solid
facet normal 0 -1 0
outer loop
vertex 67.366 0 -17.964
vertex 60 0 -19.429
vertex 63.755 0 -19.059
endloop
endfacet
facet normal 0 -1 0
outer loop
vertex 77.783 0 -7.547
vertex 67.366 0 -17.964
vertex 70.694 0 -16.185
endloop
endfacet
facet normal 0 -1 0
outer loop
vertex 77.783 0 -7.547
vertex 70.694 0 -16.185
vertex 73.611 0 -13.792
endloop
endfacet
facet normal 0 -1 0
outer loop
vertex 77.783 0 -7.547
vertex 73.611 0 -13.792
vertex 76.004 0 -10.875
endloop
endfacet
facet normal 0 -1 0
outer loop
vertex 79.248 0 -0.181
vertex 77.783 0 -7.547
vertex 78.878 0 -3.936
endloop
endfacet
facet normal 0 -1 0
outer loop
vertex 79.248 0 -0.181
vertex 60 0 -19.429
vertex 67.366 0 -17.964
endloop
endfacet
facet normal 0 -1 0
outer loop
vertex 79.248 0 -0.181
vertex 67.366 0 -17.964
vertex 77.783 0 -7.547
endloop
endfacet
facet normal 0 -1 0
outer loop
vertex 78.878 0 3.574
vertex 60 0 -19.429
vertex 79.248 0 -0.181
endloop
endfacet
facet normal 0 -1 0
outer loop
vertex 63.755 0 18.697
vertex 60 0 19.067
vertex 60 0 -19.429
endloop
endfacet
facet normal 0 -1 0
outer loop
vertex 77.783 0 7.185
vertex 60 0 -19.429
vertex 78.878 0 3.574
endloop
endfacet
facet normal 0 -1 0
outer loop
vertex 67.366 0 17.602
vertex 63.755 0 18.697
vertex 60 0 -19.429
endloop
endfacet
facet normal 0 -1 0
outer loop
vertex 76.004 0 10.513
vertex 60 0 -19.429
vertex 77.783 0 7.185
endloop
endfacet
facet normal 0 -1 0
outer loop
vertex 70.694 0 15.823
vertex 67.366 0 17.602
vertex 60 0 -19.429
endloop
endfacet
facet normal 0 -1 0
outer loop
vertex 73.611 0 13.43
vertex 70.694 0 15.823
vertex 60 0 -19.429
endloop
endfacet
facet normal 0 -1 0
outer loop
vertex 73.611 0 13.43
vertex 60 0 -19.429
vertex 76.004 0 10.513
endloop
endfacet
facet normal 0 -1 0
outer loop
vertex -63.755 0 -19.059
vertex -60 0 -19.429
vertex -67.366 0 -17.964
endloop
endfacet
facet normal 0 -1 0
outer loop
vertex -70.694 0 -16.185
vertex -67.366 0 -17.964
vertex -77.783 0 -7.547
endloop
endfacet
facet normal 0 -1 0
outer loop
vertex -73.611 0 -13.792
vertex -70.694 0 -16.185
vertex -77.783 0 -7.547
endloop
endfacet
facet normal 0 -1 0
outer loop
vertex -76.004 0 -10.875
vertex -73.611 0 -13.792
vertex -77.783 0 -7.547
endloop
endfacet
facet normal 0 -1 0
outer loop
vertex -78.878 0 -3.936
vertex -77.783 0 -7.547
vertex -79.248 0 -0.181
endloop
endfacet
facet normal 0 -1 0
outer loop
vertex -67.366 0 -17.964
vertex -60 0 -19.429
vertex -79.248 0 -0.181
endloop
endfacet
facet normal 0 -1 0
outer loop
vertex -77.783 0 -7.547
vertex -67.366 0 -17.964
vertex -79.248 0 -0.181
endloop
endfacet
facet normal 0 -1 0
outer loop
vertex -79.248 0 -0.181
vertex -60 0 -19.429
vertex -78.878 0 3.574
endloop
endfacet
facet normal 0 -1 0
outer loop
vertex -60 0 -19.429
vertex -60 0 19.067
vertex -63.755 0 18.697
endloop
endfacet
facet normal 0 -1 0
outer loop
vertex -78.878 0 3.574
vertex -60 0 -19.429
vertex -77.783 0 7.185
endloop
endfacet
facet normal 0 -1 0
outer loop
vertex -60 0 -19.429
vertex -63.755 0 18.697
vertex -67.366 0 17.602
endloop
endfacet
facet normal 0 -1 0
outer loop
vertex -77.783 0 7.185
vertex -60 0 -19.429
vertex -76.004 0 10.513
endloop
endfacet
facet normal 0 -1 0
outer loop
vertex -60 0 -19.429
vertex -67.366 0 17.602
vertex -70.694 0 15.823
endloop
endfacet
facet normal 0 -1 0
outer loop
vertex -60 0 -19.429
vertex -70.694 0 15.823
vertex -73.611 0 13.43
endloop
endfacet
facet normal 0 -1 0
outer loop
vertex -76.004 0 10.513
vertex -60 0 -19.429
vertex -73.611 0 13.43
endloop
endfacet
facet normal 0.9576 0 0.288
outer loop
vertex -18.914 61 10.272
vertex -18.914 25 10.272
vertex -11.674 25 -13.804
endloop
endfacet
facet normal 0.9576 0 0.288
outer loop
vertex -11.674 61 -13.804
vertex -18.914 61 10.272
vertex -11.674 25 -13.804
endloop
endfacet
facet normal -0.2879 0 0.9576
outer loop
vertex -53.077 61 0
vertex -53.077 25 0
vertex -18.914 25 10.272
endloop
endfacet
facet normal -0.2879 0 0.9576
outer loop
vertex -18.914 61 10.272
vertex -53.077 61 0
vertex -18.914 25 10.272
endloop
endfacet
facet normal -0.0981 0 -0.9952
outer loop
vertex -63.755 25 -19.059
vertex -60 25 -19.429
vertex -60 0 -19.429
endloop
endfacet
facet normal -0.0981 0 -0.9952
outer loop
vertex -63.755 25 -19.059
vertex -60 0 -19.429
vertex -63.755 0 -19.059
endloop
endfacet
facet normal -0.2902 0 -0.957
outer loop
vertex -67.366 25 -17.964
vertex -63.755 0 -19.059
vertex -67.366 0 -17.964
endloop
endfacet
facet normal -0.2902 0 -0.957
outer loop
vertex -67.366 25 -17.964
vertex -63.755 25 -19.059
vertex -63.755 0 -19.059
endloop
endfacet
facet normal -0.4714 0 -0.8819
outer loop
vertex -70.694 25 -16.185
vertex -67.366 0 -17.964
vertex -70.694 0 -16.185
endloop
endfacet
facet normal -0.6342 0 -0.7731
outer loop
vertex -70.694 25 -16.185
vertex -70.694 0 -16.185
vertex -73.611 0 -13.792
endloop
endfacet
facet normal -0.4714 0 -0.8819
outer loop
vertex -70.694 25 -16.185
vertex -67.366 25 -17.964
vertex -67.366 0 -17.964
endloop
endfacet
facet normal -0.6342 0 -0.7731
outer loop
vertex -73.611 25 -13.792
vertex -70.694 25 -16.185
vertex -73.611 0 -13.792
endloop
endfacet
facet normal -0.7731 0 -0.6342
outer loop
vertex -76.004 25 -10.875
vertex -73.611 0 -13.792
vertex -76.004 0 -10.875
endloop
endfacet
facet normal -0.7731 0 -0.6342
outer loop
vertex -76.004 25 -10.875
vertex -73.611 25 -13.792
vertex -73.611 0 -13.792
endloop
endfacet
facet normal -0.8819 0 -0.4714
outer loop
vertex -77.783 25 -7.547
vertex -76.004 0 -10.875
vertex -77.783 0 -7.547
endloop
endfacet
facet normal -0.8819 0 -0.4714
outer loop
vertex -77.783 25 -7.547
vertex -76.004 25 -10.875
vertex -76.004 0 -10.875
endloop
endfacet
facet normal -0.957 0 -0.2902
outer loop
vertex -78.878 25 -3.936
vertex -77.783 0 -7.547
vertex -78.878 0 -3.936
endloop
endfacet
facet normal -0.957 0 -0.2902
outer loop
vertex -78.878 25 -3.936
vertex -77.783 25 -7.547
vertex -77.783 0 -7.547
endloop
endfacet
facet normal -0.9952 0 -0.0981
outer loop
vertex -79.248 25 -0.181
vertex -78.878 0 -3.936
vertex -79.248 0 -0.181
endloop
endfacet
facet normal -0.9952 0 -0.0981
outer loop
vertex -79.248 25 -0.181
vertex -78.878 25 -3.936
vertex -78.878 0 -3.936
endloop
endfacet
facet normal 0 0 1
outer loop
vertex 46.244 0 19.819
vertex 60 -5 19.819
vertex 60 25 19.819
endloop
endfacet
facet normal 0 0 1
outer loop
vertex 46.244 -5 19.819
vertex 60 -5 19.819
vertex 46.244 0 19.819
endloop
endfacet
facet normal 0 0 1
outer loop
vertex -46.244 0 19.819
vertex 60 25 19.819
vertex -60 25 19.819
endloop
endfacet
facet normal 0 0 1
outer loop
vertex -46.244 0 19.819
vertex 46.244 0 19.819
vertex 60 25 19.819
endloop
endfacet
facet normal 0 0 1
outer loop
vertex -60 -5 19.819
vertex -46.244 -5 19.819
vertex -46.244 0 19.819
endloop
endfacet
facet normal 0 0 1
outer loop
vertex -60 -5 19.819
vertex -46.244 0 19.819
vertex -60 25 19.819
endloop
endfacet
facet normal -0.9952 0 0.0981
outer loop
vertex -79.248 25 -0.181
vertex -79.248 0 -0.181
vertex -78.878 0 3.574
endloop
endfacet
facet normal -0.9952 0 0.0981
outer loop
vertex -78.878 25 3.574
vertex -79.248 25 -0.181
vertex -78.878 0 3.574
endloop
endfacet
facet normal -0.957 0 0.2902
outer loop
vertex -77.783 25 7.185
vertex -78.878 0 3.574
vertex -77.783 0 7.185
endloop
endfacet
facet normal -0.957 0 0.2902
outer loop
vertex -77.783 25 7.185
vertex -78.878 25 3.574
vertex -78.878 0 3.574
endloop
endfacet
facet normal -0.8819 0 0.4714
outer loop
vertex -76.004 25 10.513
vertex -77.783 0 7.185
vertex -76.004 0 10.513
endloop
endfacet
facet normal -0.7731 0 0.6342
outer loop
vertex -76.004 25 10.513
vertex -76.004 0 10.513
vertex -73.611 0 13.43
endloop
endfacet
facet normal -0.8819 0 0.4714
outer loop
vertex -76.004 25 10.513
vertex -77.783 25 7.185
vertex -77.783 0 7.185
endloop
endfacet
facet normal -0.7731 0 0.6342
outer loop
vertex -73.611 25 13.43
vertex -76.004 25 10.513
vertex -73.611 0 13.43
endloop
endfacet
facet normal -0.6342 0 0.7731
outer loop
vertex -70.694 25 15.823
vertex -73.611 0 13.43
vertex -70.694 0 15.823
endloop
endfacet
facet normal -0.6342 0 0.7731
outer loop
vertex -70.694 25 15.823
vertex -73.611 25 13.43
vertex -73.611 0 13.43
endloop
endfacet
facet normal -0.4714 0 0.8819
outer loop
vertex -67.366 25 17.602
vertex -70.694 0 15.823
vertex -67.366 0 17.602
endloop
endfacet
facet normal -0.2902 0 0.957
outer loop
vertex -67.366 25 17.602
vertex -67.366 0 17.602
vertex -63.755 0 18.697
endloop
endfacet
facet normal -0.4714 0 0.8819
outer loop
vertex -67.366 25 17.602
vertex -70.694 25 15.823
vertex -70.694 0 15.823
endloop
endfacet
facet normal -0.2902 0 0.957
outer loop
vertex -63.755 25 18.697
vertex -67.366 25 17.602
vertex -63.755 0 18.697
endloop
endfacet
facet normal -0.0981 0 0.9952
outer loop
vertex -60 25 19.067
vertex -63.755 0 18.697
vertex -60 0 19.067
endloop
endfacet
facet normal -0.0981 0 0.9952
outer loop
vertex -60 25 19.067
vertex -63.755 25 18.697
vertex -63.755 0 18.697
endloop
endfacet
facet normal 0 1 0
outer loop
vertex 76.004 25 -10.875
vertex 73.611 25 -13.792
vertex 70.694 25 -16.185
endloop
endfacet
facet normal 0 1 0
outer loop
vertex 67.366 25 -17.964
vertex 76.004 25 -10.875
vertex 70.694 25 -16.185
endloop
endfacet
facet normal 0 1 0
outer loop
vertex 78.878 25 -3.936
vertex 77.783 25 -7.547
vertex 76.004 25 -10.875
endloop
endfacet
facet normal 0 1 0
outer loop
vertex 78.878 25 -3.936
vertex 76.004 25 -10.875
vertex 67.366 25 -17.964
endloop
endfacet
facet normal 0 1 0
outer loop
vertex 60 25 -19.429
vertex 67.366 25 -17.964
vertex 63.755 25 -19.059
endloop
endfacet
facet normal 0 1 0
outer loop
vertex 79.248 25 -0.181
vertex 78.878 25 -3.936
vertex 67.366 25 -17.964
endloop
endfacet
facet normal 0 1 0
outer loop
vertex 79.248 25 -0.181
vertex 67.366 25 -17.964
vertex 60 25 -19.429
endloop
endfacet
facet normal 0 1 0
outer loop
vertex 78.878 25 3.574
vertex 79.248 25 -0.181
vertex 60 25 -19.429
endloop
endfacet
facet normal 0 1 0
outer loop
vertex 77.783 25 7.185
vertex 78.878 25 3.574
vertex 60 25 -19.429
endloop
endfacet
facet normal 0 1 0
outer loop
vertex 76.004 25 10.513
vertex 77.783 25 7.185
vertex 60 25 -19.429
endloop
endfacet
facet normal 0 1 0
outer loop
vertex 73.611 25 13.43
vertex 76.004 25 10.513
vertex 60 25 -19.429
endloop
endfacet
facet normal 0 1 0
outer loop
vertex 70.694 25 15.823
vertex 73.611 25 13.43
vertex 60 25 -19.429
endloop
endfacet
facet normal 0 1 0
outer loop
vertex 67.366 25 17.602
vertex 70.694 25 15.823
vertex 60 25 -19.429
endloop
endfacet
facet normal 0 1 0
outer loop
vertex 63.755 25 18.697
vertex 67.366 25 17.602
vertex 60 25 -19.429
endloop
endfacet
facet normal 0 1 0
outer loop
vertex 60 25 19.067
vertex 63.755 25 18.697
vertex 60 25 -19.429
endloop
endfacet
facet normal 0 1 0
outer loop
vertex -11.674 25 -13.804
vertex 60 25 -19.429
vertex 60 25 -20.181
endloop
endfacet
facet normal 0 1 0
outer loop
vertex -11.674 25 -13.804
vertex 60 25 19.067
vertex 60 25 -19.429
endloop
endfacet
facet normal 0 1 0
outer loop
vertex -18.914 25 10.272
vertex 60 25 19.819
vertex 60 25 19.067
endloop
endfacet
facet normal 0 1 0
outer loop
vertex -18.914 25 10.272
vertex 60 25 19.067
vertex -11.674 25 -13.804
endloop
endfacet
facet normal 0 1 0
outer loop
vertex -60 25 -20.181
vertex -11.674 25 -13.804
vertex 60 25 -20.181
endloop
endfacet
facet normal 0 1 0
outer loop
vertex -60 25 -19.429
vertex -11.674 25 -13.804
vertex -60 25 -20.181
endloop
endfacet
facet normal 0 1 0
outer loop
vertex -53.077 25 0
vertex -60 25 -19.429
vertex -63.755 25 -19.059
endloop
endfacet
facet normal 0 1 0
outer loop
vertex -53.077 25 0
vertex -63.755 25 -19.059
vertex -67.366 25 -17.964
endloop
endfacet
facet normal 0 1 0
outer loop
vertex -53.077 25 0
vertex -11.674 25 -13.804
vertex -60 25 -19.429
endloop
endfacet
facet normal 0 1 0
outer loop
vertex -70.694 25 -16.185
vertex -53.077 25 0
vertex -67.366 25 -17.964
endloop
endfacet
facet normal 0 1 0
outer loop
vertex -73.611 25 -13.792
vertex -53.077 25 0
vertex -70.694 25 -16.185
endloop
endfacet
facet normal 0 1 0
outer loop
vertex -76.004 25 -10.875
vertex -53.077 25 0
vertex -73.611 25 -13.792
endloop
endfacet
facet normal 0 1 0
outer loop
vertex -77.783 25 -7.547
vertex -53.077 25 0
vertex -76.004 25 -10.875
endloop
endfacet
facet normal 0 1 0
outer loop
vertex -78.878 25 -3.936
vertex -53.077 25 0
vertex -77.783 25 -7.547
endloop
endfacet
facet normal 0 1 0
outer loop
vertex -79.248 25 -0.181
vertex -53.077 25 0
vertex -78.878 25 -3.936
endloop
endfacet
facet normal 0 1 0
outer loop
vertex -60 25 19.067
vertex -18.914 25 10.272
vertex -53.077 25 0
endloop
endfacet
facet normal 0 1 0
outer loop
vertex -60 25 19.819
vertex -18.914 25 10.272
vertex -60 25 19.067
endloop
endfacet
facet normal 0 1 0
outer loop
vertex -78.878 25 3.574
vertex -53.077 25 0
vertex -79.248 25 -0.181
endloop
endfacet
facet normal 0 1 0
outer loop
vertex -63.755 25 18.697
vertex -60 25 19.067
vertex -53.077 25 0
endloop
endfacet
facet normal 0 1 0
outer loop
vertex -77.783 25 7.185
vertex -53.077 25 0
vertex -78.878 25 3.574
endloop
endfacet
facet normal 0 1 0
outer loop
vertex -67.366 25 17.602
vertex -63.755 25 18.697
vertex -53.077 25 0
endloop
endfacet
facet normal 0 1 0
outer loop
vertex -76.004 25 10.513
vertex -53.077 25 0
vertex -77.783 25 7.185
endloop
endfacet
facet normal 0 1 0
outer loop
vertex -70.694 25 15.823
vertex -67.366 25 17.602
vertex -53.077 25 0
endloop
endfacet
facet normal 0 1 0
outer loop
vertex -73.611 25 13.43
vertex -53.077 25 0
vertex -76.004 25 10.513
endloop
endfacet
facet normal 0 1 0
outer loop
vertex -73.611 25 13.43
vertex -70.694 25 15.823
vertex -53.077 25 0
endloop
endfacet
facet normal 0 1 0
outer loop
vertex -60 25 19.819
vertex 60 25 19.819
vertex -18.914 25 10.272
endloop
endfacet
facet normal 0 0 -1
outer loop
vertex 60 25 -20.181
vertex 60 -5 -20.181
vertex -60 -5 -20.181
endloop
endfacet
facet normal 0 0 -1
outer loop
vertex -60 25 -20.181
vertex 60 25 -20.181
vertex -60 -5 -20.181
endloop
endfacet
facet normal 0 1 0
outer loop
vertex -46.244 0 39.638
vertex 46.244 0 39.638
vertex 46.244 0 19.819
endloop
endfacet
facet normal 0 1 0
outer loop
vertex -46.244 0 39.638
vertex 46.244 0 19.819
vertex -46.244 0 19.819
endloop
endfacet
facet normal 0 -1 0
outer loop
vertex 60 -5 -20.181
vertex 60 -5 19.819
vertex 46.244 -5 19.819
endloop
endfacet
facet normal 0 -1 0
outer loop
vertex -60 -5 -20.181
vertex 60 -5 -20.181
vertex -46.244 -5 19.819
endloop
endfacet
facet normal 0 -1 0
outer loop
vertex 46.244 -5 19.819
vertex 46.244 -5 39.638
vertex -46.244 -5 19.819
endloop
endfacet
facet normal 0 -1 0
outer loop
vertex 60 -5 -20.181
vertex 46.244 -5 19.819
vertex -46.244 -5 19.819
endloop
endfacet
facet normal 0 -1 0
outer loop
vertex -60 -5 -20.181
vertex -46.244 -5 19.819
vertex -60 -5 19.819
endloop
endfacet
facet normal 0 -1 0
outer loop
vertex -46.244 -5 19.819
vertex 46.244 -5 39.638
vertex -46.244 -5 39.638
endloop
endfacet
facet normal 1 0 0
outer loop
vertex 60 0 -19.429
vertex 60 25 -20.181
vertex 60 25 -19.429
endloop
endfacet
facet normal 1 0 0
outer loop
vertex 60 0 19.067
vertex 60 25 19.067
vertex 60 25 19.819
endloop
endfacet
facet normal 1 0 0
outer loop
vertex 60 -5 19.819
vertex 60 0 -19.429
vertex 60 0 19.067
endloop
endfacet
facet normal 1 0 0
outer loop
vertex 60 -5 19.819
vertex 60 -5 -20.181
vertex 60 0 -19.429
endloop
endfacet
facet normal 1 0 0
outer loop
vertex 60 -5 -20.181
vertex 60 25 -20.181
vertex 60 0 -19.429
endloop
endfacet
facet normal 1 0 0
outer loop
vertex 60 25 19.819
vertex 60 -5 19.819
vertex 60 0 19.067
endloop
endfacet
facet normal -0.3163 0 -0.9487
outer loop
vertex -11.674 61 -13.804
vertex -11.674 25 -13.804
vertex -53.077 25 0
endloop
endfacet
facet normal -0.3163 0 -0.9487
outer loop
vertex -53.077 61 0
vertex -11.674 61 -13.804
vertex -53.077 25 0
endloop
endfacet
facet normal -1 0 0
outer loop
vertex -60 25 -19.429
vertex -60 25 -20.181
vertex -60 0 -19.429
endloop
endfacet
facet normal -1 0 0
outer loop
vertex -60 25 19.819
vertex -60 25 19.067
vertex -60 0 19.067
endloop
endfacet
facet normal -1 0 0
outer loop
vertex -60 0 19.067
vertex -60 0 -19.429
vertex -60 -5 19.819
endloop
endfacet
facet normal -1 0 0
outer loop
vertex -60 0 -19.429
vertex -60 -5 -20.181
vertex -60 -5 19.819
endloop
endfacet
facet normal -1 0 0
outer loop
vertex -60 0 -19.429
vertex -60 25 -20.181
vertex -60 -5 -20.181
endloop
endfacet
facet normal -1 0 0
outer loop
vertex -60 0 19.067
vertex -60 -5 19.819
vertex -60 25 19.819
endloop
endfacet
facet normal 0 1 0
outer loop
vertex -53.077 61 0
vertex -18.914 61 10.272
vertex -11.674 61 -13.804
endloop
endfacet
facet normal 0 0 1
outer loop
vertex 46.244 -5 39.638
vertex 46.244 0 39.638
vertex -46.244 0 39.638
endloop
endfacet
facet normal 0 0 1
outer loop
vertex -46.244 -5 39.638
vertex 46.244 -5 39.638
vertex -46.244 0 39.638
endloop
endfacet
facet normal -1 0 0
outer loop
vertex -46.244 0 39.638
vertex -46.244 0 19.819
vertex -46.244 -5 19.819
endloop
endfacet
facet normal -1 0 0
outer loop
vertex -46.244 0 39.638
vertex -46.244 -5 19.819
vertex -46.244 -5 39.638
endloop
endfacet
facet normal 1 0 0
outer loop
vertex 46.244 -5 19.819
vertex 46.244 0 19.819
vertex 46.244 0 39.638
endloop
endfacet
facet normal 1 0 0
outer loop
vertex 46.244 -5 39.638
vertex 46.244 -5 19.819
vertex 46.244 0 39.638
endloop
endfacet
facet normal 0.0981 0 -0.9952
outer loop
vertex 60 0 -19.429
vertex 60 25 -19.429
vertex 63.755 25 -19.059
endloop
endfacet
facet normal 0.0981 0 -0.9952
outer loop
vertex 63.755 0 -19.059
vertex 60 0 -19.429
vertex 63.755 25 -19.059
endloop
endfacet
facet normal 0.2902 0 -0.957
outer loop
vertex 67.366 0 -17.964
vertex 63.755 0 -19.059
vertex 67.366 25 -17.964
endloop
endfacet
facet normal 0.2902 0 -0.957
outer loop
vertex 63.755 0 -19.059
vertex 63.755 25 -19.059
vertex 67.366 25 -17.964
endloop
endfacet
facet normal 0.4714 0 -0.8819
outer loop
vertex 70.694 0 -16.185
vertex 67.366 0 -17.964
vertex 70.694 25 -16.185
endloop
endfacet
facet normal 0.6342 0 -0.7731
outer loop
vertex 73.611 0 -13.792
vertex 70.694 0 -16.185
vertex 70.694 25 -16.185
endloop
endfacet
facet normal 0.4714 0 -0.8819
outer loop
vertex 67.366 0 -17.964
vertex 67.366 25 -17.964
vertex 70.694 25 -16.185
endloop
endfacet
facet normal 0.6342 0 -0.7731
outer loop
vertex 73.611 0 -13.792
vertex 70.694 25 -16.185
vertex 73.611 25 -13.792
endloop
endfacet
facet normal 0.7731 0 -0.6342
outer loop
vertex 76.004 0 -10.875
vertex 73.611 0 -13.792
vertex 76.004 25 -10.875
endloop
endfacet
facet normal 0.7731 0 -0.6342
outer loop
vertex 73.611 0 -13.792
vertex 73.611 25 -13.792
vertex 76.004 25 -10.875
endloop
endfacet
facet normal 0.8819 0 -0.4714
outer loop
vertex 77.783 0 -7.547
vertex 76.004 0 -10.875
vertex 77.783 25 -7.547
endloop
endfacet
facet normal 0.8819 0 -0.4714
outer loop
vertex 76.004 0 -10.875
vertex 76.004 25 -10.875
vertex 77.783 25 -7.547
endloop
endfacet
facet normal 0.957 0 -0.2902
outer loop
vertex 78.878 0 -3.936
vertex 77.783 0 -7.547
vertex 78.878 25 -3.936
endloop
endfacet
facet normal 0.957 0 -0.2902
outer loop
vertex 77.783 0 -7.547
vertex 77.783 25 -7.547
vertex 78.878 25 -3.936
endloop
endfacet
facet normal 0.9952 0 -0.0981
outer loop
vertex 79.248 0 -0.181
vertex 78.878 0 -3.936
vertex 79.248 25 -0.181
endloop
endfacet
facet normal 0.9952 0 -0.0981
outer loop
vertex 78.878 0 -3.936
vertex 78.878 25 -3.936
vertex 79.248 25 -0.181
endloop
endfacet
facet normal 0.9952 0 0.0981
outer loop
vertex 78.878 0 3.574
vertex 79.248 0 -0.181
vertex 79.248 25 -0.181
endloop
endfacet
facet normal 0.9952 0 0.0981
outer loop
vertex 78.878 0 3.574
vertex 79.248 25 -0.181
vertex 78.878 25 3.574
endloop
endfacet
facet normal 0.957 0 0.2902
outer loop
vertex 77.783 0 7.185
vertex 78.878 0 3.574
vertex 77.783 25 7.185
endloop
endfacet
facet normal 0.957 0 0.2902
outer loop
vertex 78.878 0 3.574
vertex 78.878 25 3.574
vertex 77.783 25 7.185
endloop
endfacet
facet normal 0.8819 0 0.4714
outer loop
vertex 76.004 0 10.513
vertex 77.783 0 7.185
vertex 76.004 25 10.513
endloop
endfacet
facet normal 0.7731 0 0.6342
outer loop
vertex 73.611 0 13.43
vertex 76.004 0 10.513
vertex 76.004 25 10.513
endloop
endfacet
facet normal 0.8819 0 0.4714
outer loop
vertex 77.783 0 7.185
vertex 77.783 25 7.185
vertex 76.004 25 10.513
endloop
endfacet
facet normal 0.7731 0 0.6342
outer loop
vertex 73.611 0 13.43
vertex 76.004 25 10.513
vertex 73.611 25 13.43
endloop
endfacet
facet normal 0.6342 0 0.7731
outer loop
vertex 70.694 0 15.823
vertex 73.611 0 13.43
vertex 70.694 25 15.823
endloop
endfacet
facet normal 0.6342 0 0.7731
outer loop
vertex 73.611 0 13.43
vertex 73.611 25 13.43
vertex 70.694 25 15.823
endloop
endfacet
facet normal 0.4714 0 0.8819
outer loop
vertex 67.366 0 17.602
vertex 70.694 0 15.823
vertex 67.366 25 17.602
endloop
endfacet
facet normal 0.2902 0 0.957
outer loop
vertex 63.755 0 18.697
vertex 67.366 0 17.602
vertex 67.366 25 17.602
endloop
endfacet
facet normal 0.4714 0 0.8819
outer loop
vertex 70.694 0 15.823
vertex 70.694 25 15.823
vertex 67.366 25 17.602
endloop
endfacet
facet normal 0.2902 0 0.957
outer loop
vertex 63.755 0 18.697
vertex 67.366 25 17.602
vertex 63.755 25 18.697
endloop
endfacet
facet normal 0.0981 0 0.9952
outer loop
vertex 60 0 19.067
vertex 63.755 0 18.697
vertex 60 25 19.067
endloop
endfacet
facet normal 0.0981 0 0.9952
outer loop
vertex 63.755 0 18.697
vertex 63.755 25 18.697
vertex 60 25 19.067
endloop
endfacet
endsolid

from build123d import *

# Parameters (mm, degrees)
F0_W     = 46.244312
F0_H     = 39.637983
F1_DEPTH = 5
F2_W     = 60
F2_H     = 40
F3_DEPTH = 30
F5_DEPTH = 25
F8_DEPTH = 36


with BuildPart() as f1:
    # F0 (on Front) → F1 (new body)
    with BuildSketch(Plane.XZ):
        with Locations((-23.122156, 19.818991)):
            Rectangle(F0_W, F0_H)
    extrude(amount=F1_DEPTH)

    # F2 (on face) → F3 (join)
    with BuildSketch(Plane.XZ.offset(5)):
        with Locations((-30, -0.181009)):
            Rectangle(F2_W, F2_H)
    extrude(amount=-F3_DEPTH)

    # F4 (on face) → F5 (join)
    with BuildSketch(Plane(origin=(0, 25, 0), x_dir=(-1, 0, 0), z_dir=(0, 1, 0))):
        with BuildLine():
            ThreePointArc((79.248183, -0.181009), (73.610521, 13.429512), (60, 19.067175))
            Line((60, 19.067175), (60, -19.429192))
            ThreePointArc((60, -19.429192), (73.610521, -13.79153), (79.248183, -0.181009))
        make_face()
    extrude(amount=-F5_DEPTH)

    # F6: F1 across plane


with BuildPart() as f1_1:
    add(f1.part)
    add(f1.part.mirror(Plane.YZ))

    # F7 (on face) → F8 (join)
    with BuildSketch(Plane(origin=(0, 25, 0), x_dir=(-1, 0, 0), z_dir=(0, 1, 0))):
        Polygon((11.674208, -13.803926), (53.077161, 0), (18.913604, 10.272454), align=None)
    extrude(amount=F8_DEPTH)


solid = f1_1.part
